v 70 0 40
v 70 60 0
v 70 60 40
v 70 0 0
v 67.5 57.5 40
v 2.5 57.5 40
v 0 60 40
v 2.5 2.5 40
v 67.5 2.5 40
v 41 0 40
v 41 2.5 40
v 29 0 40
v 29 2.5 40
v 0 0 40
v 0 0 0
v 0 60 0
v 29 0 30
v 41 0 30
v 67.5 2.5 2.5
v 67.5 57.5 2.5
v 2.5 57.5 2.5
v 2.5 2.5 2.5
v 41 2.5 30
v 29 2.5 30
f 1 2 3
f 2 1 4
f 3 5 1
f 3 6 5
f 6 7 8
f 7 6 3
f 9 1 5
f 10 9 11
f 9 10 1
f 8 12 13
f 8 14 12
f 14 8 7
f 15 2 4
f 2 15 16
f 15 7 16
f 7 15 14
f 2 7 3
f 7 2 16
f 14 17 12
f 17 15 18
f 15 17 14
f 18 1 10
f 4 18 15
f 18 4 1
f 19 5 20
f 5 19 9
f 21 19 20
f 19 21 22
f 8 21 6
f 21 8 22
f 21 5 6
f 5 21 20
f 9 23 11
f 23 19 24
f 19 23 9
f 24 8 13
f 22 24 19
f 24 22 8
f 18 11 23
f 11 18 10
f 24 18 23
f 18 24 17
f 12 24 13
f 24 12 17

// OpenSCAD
$fn = 32;

// ----------------------------------------------------------------------
// Enclosure box: notch enclosure
// ----------------------------------------------------------------------

// --- parameters (mm) ---
box_l = 70;               // outer length, X
box_w = 60;               // outer width, Y
box_h = 40;               // outer height
wall_t = 2.5;             // wall thickness
notch_w = 12;             // cable notch width
notch_h = 10;             // cable notch height

inner_h = box_h - wall_t;  // cavity depth
boss_h = inner_h - 2;  // corner boss height

difference() {
  cube([box_l, box_w, box_h]);
  translate([wall_t, wall_t, wall_t])
    cube([box_l - 2 * wall_t, box_w - 2 * wall_t, box_h]);
  translate([box_l / 2 - notch_w / 2, -1, box_h - notch_h])
    cube([notch_w, wall_t + 2, notch_h + 1]);
}
